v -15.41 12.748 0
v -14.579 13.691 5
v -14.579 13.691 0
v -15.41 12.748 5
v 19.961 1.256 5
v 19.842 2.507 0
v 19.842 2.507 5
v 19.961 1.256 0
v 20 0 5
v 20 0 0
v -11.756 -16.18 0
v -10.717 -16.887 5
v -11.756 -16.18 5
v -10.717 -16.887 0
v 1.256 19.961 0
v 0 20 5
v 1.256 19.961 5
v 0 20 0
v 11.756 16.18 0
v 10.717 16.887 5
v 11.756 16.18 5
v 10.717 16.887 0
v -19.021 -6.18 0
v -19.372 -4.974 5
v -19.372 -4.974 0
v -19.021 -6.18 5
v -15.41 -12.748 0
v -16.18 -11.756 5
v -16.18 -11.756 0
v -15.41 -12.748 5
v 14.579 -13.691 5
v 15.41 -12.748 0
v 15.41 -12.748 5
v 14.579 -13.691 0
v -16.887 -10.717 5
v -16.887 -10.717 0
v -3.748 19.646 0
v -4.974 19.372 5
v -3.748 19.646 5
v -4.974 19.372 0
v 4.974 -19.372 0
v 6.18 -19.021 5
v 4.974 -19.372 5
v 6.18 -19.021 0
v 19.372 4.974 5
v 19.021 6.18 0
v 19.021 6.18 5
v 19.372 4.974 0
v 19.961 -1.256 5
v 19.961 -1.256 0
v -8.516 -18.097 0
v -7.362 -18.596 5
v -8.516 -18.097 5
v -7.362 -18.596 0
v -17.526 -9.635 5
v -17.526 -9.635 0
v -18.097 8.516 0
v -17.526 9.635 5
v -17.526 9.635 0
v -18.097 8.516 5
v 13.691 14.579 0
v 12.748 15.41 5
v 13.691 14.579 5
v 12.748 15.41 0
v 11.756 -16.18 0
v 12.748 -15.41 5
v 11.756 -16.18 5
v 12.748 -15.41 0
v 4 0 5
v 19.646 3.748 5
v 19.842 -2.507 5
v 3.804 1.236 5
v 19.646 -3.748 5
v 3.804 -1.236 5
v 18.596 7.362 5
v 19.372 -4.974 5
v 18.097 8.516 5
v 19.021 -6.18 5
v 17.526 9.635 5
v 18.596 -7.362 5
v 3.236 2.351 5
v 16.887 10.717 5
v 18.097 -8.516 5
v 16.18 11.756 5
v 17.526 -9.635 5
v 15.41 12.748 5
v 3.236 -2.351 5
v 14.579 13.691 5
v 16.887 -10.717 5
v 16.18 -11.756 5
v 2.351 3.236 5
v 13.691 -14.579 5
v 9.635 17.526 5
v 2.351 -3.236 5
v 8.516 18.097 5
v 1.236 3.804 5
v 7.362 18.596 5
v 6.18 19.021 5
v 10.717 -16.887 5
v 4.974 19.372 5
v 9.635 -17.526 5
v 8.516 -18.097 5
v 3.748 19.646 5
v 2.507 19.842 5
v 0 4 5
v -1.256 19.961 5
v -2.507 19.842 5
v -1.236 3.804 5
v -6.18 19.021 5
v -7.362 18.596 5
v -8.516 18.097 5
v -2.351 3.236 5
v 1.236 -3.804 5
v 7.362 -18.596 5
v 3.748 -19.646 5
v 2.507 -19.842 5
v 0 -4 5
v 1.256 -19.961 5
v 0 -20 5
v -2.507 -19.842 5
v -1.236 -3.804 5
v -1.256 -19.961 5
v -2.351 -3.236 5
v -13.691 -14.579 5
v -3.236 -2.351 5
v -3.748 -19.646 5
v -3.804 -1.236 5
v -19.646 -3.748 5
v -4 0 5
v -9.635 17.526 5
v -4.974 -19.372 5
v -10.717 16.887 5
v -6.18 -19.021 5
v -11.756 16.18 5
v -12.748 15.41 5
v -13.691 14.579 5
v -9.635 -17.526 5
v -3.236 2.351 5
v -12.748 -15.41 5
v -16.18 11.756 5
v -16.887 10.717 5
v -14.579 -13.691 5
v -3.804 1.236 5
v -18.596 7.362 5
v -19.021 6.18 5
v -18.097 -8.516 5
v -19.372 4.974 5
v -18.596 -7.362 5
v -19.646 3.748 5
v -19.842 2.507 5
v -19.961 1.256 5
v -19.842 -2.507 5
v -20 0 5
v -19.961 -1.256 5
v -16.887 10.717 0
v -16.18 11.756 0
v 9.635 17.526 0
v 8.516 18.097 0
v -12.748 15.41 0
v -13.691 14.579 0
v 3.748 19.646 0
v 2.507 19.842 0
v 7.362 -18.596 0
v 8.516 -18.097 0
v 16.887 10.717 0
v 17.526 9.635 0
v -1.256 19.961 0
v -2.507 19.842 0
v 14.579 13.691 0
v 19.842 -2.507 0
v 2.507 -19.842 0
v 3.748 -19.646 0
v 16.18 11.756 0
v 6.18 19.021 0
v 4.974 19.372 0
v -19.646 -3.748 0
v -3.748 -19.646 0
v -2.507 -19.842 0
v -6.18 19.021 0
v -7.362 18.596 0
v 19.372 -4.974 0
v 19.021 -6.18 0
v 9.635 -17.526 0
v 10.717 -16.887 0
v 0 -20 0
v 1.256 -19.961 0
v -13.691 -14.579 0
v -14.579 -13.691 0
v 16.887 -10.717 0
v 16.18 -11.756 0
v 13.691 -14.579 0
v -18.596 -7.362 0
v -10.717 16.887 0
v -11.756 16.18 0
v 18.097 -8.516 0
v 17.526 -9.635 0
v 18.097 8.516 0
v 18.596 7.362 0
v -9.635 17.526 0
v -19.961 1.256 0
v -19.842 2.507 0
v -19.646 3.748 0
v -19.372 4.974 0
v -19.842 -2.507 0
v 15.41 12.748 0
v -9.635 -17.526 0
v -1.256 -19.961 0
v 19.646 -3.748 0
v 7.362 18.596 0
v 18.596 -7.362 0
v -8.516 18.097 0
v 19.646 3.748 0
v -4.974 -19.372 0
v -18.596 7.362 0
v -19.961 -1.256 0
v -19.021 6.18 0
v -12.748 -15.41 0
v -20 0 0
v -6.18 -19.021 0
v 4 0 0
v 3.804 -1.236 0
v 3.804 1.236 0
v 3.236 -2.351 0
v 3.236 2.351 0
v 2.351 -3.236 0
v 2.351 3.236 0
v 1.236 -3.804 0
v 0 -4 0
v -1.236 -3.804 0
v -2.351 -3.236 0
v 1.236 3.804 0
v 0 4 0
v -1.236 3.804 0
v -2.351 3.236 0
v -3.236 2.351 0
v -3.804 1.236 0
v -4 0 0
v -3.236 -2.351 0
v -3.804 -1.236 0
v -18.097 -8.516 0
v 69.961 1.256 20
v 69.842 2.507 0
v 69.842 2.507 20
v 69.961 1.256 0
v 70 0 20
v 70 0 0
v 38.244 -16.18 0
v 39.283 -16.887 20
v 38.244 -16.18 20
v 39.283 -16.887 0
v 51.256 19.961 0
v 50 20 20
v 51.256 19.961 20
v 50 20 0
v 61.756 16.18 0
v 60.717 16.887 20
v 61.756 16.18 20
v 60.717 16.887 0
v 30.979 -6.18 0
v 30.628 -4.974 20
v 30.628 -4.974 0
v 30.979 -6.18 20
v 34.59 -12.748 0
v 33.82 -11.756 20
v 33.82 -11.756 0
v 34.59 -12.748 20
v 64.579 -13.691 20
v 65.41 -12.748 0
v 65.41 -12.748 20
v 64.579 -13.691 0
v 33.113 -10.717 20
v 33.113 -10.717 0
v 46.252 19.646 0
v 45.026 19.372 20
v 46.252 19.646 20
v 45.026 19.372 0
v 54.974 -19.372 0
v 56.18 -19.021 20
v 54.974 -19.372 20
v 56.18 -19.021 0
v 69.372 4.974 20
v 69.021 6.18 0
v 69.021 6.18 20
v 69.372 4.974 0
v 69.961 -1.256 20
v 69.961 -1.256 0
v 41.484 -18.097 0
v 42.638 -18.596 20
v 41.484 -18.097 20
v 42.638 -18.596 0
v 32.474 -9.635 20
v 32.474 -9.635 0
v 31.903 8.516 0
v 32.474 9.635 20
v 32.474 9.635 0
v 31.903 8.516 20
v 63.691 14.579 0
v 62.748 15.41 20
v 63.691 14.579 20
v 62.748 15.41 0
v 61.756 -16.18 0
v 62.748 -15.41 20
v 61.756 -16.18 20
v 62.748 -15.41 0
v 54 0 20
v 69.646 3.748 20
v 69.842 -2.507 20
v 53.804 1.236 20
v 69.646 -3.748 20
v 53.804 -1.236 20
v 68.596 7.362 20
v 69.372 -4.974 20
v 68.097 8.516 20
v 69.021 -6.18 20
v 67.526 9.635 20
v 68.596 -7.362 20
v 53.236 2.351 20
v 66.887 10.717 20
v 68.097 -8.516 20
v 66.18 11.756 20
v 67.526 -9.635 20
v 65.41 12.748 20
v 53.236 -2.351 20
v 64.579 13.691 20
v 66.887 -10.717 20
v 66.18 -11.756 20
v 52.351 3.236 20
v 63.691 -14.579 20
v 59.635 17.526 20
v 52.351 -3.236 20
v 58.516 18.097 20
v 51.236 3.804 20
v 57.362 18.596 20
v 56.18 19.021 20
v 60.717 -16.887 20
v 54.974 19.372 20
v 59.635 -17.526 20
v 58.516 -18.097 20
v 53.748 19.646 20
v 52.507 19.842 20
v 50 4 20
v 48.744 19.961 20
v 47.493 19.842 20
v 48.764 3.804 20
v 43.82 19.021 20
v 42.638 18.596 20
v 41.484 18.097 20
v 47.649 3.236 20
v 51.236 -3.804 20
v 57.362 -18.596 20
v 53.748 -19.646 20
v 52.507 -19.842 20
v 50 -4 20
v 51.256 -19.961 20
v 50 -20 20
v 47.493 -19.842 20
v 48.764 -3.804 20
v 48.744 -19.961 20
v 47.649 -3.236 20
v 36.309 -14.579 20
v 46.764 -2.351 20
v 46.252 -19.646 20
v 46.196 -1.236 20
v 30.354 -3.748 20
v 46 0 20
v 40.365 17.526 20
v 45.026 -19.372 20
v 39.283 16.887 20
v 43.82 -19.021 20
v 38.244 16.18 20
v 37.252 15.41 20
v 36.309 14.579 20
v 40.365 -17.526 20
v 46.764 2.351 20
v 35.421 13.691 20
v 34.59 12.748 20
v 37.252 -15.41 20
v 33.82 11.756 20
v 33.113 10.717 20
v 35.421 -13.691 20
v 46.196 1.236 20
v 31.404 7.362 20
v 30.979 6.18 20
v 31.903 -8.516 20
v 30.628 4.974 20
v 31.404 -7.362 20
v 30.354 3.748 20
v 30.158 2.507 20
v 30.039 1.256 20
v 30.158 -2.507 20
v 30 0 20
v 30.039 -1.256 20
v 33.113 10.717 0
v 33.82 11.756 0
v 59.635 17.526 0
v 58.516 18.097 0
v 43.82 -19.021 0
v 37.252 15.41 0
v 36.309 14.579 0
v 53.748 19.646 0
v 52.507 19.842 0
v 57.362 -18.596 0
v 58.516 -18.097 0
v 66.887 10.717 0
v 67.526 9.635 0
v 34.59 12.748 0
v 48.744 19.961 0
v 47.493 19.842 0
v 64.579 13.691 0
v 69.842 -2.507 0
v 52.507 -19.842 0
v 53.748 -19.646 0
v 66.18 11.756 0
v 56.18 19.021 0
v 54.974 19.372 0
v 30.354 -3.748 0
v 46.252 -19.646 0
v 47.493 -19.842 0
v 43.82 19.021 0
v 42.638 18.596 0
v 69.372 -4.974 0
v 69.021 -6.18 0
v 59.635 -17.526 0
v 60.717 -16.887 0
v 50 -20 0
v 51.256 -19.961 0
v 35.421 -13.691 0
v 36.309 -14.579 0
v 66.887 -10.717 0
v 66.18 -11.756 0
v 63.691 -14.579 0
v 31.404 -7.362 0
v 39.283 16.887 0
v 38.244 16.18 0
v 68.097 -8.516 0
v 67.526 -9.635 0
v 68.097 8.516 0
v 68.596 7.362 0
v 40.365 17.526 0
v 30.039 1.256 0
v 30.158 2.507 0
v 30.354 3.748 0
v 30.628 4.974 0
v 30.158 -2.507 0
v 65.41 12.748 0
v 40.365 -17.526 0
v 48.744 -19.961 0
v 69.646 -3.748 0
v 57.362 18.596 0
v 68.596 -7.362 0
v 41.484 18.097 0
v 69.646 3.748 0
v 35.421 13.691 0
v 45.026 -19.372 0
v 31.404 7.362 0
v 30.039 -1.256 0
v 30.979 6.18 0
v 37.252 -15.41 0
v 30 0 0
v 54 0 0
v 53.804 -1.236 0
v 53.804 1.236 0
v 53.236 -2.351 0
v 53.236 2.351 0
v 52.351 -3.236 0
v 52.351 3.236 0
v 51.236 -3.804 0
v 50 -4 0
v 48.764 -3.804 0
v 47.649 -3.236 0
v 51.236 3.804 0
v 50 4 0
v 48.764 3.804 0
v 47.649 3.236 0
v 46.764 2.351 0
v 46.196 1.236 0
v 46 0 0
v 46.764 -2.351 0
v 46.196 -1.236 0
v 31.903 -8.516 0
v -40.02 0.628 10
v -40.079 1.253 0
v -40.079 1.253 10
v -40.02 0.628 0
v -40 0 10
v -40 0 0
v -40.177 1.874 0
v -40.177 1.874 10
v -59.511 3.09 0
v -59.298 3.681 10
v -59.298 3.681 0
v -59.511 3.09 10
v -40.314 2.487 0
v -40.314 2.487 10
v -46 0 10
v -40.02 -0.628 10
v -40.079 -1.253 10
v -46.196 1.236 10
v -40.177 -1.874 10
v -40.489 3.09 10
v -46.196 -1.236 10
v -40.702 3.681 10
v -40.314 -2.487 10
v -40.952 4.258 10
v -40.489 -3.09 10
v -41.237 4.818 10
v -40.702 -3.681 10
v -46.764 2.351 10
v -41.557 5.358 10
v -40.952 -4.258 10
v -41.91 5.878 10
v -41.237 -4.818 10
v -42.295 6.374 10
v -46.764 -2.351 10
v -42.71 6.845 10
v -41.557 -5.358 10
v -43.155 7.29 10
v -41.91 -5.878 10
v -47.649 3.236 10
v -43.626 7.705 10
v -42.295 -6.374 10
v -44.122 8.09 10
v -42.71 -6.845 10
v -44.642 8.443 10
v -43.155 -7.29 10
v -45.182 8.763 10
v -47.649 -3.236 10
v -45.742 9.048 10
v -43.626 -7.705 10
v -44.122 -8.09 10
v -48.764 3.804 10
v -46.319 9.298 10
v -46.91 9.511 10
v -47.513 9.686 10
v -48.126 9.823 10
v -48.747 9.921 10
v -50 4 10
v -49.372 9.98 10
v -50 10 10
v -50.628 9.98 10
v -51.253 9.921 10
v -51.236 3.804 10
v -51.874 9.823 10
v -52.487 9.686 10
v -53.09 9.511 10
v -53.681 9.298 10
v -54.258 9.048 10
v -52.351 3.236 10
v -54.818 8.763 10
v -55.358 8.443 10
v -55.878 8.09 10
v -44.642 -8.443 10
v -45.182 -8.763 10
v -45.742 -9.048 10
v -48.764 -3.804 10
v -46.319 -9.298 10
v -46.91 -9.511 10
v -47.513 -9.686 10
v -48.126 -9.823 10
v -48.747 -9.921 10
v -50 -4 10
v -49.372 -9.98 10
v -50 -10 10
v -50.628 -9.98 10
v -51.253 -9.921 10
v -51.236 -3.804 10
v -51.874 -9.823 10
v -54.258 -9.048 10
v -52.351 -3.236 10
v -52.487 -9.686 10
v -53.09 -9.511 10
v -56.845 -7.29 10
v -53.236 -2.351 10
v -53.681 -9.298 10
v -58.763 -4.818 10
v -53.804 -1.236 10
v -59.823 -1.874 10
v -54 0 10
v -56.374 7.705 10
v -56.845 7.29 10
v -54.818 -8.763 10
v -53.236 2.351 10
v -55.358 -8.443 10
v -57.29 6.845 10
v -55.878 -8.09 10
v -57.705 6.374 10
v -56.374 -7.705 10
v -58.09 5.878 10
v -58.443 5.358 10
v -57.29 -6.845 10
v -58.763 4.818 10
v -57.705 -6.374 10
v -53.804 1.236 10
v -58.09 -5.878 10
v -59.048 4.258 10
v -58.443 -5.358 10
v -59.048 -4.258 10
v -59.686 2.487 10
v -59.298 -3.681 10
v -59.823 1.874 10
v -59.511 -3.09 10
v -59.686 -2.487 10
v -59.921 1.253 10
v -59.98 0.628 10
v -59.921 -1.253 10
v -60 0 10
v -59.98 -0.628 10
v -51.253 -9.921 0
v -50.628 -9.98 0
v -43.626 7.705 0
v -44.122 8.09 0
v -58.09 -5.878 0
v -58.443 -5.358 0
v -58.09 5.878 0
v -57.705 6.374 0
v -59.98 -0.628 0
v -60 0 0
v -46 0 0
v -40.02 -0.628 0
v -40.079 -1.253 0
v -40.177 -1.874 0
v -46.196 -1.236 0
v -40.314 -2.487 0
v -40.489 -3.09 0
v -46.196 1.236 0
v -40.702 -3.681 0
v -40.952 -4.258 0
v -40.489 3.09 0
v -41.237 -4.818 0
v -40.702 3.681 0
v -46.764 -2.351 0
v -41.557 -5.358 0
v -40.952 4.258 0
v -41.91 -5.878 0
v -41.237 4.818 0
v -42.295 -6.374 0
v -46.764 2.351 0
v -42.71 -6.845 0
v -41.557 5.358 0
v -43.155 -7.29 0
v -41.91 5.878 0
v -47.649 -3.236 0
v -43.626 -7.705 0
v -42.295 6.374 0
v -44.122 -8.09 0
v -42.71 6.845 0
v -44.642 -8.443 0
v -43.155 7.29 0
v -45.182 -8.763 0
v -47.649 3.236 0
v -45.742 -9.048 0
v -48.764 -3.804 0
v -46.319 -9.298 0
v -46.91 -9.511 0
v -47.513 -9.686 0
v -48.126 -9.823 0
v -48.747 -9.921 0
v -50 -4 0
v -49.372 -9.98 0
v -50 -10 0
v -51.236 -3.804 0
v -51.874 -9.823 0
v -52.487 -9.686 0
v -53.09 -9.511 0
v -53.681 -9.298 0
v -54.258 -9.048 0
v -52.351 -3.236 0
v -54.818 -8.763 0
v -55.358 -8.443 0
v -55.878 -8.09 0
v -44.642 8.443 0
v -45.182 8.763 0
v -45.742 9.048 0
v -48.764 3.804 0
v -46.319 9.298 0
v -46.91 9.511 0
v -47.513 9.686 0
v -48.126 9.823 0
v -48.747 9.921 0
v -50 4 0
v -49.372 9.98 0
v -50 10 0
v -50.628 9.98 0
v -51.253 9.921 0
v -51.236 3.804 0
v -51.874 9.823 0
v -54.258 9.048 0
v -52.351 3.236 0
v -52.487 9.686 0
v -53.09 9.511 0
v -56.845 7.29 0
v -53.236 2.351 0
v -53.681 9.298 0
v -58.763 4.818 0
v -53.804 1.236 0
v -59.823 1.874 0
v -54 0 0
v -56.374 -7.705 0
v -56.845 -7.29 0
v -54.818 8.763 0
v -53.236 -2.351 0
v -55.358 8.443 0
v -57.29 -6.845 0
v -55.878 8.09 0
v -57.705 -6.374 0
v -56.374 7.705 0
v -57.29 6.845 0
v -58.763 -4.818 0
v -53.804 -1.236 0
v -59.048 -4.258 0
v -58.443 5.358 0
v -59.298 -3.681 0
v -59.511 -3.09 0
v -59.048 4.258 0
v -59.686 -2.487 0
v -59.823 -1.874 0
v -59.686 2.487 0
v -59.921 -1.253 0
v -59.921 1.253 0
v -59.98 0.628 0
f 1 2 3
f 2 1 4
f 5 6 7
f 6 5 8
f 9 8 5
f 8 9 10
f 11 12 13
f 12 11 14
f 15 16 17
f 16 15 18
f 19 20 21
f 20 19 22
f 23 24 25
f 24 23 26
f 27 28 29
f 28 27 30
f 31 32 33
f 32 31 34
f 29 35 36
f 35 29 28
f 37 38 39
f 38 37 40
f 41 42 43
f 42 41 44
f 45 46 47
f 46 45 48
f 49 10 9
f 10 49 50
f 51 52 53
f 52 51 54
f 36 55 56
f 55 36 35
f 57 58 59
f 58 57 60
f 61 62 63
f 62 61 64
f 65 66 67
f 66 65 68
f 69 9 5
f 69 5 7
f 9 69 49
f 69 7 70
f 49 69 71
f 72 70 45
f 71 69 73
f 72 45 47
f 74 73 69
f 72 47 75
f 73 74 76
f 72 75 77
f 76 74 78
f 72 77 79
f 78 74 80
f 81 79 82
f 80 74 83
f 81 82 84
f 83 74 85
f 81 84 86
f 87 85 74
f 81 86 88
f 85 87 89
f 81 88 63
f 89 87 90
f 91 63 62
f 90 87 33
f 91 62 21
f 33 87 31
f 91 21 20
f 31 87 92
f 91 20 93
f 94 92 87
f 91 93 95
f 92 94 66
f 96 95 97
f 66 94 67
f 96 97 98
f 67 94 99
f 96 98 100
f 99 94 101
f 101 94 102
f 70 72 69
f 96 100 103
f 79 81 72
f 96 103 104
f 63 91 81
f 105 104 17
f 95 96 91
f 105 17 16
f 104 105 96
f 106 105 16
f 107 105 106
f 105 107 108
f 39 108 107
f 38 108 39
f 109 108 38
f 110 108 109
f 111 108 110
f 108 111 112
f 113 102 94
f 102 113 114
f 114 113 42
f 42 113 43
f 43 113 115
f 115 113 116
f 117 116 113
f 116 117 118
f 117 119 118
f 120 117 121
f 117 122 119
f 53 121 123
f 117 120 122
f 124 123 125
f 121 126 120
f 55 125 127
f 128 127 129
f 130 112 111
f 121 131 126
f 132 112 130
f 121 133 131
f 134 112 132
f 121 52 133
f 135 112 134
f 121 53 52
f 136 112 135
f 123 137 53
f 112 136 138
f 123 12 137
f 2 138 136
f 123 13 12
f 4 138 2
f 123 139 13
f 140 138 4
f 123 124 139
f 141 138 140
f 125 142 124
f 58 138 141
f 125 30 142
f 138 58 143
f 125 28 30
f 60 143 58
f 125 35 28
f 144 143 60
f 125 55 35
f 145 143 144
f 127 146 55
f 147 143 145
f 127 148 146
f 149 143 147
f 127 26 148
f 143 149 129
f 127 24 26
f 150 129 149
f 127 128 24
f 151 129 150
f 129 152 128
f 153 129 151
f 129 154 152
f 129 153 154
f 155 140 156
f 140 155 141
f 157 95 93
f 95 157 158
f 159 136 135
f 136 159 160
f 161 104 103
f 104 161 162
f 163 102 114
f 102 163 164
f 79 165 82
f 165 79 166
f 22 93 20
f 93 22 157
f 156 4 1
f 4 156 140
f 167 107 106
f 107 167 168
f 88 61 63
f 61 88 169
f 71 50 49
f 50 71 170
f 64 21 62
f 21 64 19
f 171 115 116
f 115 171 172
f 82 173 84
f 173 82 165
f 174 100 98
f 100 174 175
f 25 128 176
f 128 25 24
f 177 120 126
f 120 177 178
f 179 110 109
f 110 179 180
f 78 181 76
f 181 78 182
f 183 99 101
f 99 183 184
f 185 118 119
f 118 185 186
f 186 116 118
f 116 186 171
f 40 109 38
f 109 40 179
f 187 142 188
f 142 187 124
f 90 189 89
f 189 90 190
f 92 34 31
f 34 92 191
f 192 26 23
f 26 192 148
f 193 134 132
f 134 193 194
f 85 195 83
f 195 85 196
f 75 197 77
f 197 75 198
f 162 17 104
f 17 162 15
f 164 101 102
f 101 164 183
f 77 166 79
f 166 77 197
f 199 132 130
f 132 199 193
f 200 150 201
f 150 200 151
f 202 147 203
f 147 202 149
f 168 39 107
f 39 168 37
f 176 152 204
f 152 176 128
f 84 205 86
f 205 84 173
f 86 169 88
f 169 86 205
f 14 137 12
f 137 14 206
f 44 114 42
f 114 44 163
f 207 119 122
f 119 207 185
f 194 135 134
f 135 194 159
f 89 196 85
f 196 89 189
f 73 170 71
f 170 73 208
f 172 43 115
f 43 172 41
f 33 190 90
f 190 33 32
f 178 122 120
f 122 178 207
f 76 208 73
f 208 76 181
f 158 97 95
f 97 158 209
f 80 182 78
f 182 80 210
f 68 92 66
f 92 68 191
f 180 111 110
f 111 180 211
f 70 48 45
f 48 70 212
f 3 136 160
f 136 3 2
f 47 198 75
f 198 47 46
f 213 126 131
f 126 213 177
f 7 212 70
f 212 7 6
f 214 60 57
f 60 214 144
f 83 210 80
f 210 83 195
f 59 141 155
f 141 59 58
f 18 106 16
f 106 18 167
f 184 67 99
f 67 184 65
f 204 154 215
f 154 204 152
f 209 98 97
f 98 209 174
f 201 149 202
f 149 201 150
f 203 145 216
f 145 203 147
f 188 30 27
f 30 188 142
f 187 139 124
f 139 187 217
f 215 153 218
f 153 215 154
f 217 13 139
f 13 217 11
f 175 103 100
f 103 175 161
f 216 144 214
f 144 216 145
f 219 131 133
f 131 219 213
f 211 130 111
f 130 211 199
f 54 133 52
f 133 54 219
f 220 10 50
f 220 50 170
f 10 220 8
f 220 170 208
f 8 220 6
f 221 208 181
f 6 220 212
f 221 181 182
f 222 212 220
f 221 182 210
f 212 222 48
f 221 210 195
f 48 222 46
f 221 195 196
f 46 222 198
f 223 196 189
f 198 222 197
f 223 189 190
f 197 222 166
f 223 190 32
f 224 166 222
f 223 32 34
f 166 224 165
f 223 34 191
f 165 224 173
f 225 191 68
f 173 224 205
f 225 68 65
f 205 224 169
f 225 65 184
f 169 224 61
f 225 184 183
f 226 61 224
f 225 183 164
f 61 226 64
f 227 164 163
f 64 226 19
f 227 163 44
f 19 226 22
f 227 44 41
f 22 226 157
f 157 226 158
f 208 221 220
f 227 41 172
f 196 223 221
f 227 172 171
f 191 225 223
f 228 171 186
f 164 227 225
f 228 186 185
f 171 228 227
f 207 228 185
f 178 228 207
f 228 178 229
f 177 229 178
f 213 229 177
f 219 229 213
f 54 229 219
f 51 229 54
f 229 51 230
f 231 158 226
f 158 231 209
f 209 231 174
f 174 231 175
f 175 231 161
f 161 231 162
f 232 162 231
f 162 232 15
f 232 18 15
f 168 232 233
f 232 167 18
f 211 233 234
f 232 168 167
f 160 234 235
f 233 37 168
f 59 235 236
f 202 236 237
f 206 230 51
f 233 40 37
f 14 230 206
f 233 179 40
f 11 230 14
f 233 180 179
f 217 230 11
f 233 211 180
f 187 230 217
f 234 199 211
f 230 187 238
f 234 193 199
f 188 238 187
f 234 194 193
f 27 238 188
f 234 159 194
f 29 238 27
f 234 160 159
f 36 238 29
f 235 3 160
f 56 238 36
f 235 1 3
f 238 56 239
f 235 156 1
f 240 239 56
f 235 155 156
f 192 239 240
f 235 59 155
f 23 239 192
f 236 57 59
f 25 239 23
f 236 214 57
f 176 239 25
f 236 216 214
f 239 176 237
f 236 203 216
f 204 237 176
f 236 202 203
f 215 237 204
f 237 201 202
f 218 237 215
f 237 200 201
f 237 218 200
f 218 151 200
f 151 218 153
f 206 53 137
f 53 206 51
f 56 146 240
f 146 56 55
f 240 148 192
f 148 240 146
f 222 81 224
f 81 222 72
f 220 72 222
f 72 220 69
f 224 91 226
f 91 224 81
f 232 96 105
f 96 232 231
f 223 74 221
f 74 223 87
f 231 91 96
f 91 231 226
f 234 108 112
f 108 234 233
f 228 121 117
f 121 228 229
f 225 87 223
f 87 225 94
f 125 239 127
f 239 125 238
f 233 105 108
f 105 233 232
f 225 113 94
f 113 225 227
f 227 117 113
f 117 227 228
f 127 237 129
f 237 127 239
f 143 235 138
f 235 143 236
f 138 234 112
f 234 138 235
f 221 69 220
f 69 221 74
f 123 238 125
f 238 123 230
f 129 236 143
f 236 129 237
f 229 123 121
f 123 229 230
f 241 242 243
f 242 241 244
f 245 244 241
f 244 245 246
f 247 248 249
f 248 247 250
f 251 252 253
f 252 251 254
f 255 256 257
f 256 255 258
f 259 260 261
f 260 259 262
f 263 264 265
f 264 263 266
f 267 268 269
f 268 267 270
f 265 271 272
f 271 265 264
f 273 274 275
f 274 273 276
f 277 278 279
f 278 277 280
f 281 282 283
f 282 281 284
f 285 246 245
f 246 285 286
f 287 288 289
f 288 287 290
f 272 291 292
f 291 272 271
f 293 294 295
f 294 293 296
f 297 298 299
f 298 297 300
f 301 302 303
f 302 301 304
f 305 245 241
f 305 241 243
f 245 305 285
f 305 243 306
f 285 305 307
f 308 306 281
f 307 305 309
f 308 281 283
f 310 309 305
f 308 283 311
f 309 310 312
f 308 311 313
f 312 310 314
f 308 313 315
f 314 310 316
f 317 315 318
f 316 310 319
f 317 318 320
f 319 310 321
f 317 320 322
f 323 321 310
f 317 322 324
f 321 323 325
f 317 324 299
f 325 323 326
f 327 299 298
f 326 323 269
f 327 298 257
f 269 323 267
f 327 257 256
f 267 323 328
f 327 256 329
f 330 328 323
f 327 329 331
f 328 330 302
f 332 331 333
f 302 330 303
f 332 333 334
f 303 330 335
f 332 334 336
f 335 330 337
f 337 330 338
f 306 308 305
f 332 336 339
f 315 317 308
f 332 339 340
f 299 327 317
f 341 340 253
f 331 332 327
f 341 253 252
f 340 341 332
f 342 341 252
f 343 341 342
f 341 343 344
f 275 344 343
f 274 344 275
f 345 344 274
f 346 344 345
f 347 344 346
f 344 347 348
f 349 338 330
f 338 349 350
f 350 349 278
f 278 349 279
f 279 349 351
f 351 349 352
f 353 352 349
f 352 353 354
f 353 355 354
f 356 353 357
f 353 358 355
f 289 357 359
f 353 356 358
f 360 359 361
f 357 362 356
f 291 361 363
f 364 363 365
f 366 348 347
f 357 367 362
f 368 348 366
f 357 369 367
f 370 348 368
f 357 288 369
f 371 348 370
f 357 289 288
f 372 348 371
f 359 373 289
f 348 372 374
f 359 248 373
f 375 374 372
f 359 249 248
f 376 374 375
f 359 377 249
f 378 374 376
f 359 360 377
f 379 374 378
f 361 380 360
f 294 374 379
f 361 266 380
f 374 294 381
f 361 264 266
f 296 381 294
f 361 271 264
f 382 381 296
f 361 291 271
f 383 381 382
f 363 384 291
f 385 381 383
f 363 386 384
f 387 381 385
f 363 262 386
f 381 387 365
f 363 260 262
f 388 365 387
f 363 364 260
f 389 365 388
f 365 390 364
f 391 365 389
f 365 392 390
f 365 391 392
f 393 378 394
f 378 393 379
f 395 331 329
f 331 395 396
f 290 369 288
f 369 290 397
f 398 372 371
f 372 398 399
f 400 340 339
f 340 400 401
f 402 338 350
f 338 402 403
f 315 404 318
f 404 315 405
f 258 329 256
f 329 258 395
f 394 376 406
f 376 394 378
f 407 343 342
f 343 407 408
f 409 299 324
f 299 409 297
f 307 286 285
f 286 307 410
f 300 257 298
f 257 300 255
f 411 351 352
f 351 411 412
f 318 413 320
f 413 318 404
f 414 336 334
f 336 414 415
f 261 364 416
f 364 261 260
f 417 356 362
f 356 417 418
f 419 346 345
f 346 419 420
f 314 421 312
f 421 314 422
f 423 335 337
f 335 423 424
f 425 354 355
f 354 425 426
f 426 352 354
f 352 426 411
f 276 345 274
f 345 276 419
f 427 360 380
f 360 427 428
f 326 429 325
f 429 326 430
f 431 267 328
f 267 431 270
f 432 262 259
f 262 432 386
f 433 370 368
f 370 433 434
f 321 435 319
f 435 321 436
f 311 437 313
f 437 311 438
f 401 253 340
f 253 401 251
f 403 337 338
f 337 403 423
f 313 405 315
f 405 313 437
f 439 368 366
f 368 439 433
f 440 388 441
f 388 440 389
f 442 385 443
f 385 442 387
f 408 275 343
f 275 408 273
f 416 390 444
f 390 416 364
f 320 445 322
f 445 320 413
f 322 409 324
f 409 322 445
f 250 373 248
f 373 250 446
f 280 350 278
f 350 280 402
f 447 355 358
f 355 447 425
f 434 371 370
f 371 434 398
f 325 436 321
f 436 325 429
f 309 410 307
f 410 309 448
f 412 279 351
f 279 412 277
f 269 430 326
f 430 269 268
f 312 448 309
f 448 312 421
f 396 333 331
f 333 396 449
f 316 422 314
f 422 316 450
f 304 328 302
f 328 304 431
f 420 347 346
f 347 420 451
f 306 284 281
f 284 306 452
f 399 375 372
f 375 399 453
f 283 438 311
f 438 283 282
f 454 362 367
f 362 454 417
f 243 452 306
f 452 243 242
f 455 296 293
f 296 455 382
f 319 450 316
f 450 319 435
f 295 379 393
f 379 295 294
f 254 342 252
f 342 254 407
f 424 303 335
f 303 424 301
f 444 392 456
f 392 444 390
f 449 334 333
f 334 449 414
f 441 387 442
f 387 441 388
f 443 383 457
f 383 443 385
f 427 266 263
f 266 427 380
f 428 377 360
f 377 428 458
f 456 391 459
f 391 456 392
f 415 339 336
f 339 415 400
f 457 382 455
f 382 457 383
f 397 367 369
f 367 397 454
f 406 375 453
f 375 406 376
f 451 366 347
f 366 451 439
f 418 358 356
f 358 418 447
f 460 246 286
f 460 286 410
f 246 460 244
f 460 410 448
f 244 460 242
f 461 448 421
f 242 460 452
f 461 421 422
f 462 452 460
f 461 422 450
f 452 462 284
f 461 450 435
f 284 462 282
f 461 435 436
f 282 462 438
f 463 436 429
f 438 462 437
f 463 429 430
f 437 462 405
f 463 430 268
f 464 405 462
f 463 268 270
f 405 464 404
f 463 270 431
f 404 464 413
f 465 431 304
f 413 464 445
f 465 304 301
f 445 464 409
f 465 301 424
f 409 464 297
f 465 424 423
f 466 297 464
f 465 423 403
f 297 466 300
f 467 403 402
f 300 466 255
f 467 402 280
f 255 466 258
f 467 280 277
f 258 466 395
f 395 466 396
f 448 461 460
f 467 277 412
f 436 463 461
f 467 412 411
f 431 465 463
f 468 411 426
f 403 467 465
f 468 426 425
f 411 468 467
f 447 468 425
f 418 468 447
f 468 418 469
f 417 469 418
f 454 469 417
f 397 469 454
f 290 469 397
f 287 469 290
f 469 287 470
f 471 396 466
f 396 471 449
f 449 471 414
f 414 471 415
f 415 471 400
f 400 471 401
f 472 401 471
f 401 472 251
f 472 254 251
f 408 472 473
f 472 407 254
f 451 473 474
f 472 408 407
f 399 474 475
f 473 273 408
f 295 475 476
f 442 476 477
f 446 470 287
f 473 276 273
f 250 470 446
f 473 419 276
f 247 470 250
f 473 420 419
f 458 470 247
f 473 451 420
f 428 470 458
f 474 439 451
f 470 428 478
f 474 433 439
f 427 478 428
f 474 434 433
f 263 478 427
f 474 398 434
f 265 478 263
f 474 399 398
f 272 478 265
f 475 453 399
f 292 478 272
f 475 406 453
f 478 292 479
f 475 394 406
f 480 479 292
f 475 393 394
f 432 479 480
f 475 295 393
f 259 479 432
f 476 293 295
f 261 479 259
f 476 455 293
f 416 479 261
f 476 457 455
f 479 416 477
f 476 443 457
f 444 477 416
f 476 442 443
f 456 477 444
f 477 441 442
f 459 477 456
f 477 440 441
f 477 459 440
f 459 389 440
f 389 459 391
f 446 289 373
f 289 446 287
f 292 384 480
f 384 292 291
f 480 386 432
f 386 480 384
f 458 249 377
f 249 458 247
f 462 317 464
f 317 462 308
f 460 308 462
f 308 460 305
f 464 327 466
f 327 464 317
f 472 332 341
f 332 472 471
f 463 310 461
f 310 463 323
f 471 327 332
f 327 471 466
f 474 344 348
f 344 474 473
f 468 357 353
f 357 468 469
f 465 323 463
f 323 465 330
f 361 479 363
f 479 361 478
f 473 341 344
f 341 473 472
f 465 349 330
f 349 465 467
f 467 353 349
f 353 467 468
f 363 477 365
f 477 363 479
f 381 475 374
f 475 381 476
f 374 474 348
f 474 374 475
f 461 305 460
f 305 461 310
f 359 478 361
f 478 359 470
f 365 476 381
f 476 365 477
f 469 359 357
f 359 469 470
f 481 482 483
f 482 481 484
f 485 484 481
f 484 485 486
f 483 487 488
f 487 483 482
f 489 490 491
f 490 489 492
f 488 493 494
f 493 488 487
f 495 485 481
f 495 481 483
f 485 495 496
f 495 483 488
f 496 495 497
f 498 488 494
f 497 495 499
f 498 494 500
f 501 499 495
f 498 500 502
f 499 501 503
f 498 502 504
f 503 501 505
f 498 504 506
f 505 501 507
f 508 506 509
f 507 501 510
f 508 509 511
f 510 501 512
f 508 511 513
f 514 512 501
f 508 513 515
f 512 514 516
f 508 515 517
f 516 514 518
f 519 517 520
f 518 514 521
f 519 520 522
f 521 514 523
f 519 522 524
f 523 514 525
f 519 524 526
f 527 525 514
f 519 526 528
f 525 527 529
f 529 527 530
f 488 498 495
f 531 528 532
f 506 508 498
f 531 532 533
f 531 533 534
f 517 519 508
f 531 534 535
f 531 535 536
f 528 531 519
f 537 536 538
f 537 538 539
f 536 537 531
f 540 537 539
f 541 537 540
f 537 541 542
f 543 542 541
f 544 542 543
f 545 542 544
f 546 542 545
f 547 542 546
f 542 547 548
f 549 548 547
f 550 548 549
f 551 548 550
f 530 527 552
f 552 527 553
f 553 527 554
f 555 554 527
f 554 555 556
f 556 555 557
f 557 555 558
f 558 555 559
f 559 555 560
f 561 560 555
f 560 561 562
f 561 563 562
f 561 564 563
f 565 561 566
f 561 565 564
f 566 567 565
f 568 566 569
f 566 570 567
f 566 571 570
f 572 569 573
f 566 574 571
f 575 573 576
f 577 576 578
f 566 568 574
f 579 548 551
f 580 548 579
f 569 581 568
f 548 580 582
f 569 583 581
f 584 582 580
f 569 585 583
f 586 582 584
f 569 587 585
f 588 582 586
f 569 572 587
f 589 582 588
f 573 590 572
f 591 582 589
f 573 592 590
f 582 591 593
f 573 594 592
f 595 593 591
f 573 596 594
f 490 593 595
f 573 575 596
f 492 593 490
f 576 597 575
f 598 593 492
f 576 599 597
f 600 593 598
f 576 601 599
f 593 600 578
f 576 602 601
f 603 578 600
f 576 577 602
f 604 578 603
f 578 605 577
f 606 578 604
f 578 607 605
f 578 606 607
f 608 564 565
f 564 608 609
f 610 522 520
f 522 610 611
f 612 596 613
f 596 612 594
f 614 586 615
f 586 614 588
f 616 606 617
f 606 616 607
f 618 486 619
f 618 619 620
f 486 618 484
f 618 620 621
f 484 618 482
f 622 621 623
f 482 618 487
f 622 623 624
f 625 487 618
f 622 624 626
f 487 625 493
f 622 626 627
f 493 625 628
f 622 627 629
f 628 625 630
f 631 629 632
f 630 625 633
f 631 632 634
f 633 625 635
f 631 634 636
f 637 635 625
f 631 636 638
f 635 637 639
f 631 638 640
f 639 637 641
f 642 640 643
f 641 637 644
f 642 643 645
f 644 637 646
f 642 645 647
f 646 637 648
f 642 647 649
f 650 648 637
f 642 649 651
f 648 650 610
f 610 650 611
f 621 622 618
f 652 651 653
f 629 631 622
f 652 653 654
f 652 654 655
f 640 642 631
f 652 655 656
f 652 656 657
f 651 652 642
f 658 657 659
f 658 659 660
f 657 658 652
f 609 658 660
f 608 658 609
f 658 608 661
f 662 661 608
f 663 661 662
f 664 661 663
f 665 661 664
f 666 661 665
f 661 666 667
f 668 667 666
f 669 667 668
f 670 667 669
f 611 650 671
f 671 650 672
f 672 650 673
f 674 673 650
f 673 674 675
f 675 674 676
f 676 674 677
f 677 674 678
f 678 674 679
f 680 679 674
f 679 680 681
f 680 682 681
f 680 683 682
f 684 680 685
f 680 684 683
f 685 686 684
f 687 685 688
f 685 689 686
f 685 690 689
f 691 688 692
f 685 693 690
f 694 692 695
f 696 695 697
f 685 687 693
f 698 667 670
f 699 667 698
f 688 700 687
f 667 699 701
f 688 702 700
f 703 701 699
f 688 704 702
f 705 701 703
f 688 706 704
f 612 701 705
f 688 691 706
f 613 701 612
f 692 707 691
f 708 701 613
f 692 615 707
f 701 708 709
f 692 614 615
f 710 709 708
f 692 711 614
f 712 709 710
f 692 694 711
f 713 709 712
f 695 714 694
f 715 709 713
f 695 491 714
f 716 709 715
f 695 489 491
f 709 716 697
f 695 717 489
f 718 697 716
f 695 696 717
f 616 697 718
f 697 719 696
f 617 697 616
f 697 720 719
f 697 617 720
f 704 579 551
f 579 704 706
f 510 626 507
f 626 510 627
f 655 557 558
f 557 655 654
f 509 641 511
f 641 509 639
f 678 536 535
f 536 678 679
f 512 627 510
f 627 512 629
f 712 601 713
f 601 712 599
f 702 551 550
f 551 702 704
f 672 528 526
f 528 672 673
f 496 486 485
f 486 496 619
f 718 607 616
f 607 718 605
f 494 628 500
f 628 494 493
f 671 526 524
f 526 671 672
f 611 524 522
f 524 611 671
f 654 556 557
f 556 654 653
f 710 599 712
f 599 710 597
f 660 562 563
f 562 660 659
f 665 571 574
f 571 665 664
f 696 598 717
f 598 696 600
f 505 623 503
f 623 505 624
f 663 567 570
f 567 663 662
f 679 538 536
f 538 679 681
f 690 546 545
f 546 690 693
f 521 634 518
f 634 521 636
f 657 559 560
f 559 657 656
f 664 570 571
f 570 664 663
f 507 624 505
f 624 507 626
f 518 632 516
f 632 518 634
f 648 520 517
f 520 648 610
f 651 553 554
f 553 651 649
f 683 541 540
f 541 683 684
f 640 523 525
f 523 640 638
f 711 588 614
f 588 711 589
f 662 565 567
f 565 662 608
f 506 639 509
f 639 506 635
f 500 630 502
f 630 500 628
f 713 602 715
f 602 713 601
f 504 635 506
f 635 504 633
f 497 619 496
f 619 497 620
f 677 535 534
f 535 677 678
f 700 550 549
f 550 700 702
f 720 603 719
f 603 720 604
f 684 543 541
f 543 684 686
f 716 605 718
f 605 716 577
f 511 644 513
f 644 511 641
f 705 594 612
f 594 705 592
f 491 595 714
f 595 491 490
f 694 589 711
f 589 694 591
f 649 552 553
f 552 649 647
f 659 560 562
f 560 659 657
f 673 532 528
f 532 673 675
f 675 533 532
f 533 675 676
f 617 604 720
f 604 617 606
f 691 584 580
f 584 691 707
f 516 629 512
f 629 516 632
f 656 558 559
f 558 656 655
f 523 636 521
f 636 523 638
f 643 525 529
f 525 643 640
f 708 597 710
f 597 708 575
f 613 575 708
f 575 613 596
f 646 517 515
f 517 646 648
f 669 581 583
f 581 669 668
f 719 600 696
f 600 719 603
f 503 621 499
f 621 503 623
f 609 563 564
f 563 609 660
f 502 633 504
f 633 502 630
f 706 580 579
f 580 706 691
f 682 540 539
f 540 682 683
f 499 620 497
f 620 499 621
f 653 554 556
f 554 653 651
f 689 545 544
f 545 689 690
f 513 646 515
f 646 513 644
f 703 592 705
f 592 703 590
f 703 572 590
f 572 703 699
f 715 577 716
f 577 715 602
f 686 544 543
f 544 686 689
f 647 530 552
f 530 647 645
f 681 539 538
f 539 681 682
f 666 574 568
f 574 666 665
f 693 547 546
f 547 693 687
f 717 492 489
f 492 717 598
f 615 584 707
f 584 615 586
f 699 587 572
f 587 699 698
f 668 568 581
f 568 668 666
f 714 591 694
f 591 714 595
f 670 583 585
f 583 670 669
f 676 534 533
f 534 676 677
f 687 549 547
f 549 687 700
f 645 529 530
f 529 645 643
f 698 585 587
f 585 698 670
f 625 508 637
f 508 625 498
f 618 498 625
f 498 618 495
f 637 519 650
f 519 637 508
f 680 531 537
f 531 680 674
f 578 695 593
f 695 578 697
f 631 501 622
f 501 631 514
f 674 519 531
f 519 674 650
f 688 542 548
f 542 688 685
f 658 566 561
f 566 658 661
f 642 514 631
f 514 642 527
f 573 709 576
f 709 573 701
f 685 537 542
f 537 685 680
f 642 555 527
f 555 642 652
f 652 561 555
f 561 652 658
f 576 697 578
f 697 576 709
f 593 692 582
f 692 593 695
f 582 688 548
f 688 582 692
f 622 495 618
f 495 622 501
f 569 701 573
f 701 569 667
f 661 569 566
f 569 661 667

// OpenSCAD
module rueda_simple(grosor=5,diametro=40,diam_eje=8){
    //-- Construcción de la rueda a partir de los parámetros
    difference(){
        //-- Base de la rueda
        cylinder(r=diametro/2,h=grosor,$fn=100);
        
        //-- Taladro del eje
        cylinder(r=diam_eje/2,h=3*grosor,$fn=20,center=true);
    }
}

//-- Ejemplos de utilización del módulo rueda simple
//-- Rueda por defecto
rueda_simple();

translate([50,0,0])
    rueda_simple(grosor=20);

translate([-50,0,0])
    rueda_simple(diametro=20,grosor=10);
